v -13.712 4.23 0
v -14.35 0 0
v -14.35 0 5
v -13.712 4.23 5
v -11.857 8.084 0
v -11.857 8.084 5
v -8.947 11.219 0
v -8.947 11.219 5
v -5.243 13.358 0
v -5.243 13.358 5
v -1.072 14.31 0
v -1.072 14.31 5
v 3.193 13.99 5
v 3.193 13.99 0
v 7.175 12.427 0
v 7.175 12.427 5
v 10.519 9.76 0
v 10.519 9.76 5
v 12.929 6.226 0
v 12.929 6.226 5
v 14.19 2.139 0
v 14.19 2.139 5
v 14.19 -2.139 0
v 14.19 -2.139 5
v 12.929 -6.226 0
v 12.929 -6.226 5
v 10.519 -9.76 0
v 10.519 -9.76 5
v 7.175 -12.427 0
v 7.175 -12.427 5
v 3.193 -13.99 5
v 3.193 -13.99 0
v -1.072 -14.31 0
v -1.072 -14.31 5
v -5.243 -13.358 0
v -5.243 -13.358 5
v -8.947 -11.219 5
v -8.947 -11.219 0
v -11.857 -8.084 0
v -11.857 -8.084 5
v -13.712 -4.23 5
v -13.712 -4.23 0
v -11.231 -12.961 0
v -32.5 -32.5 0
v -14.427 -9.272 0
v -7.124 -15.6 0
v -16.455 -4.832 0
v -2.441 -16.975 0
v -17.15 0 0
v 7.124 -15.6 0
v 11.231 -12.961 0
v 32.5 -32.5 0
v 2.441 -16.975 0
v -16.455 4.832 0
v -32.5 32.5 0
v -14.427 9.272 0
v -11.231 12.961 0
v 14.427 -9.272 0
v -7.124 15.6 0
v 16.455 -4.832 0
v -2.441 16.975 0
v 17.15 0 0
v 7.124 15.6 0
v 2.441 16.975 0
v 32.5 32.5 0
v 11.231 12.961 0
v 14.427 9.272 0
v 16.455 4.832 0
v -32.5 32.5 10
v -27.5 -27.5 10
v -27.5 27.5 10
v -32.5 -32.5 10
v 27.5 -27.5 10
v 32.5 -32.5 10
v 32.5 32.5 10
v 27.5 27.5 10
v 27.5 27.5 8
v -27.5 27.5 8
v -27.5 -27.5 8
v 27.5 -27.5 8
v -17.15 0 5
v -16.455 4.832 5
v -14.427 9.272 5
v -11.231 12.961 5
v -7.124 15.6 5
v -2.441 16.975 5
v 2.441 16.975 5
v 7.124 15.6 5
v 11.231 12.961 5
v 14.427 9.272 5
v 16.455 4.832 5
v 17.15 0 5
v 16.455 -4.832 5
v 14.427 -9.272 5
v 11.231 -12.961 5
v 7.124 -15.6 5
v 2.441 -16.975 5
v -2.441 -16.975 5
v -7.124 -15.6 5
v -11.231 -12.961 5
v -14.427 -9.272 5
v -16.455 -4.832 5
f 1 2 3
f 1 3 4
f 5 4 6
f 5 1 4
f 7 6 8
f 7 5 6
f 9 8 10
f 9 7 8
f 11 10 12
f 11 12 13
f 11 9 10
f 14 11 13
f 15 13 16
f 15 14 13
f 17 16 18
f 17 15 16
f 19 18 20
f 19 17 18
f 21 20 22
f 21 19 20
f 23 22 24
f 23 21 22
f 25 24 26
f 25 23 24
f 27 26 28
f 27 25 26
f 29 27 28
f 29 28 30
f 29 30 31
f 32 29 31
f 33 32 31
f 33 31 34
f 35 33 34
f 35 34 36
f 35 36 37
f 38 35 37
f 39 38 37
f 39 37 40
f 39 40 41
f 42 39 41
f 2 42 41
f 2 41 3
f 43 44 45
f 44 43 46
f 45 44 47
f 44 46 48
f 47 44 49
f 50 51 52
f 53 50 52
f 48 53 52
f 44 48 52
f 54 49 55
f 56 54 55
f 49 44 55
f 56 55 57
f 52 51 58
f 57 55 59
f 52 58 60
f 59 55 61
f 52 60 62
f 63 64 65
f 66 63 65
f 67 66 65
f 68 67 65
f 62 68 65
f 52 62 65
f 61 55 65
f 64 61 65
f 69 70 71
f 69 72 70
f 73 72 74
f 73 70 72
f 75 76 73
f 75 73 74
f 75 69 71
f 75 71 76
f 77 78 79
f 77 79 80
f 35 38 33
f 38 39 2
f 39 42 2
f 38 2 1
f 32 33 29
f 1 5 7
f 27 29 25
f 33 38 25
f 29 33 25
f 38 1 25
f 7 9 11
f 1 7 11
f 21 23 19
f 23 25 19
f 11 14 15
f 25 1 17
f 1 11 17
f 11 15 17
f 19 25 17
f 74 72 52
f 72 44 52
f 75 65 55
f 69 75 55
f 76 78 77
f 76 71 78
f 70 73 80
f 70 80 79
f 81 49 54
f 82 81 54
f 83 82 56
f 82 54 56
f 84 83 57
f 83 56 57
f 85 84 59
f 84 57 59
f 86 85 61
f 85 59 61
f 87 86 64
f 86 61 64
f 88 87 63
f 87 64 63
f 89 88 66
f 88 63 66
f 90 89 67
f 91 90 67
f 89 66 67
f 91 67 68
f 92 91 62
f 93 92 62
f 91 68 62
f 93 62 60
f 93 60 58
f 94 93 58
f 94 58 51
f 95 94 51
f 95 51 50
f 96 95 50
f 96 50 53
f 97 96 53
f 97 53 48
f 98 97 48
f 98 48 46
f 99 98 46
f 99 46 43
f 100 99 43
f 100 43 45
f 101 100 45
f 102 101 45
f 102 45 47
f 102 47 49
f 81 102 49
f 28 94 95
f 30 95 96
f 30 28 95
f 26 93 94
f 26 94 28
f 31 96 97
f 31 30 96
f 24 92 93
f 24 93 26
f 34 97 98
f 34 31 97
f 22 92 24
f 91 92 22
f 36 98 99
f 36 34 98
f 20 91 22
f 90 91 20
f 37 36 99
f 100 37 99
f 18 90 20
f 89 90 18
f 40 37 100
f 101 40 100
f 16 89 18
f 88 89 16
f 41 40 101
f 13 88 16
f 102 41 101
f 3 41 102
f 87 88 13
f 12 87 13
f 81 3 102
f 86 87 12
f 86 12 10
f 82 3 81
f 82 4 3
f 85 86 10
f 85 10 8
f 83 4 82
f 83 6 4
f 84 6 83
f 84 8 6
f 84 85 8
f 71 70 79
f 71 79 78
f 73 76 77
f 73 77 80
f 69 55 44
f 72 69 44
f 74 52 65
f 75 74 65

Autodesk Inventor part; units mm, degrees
ref_plane "YZ Plane" through (0, 0, 0) normal (1, 0, 0) x (0, 1, 0)
ref_plane "XZ Plane" through (0, 0, 0) normal (0, 1, 0) x (-1, 0, 0)
ref_plane "XY Plane" through (0, 0, 0) normal (0, 0, 1) x (1, 0, 0)
sketch "Sketch5" plane through (0, 0, 0) normal (0, 0, 1) x (1, 0, 0)
  circle A0 centre (0, 0) radius 14.35
  circle A1 centre (0, 0) radius 17.15
  line L0 (32.5, 32.5) -> (-32.5, 32.5)
  line L1 (-32.5, 32.5) -> (-32.5, -32.5)
  line L2 (-32.5, -32.5) -> (32.5, -32.5)
  line L3 (32.5, -32.5) -> (32.5, 32.5)
  line L4 (-27.5, 27.5) -> (27.5, 27.5)
  line L5 (27.5, 27.5) -> (27.5, -27.5)
  line L6 (27.5, -27.5) -> (-27.5, -27.5)
  line L7 (-27.5, -27.5) -> (-27.5, 27.5)
  dimension "d36" = 28.7
  dimension "d37" = 34.3
  dimension "d38" = 65
  dimension "d39" = 65
  dimension "d40" = 55
  dimension "d41" = 55
extrude "Extrusion7" add sketch "Sketch5" along normal blind 10 contours A0 | A1 | L3 L2 L1 L0 | L4 L5 L6 L7
sketch "Sketch6" plane through (0, 0, 0) normal (0, 0, -1) x (-1, 0, 0)
  circle A0 centre (0, 0) radius 14.35
  circle A1 centre (0, 0) radius 17.15
  line L0 (-27.5, 27.5) -> (27.5, 27.5)
  line L1 (27.5, 27.5) -> (27.5, -27.5)
  line L2 (27.5, -27.5) -> (-27.5, -27.5)
  line L3 (-27.5, -27.5) -> (-27.5, 27.5)
  dimension "d44" = 28.7
  dimension "d45" = 34.3
  dimension "d46" = 55
  dimension "d47" = 55
extrude "Extrusion8" cut sketch "Sketch6" against normal blind 5 contours A1
sketch "Sketch7" plane through (0, 0, 10) normal (0, 0, 1) x (1, 0, 0)
  line L0 (-27.5, 27.5) -> (27.5, 27.5)
  line L1 (27.5, 27.5) -> (27.5, -27.5)
  line L2 (27.5, -27.5) -> (-27.5, -27.5)
  line L3 (-27.5, -27.5) -> (-27.5, 27.5)
  point P0 (0, 0)
  dimension "d50" = 55
  dimension "d51" = 55
extrude "Extrusion9" cut sketch "Sketch7" against normal blind 2
properties part number "Clip_MarkerHolderV1"
